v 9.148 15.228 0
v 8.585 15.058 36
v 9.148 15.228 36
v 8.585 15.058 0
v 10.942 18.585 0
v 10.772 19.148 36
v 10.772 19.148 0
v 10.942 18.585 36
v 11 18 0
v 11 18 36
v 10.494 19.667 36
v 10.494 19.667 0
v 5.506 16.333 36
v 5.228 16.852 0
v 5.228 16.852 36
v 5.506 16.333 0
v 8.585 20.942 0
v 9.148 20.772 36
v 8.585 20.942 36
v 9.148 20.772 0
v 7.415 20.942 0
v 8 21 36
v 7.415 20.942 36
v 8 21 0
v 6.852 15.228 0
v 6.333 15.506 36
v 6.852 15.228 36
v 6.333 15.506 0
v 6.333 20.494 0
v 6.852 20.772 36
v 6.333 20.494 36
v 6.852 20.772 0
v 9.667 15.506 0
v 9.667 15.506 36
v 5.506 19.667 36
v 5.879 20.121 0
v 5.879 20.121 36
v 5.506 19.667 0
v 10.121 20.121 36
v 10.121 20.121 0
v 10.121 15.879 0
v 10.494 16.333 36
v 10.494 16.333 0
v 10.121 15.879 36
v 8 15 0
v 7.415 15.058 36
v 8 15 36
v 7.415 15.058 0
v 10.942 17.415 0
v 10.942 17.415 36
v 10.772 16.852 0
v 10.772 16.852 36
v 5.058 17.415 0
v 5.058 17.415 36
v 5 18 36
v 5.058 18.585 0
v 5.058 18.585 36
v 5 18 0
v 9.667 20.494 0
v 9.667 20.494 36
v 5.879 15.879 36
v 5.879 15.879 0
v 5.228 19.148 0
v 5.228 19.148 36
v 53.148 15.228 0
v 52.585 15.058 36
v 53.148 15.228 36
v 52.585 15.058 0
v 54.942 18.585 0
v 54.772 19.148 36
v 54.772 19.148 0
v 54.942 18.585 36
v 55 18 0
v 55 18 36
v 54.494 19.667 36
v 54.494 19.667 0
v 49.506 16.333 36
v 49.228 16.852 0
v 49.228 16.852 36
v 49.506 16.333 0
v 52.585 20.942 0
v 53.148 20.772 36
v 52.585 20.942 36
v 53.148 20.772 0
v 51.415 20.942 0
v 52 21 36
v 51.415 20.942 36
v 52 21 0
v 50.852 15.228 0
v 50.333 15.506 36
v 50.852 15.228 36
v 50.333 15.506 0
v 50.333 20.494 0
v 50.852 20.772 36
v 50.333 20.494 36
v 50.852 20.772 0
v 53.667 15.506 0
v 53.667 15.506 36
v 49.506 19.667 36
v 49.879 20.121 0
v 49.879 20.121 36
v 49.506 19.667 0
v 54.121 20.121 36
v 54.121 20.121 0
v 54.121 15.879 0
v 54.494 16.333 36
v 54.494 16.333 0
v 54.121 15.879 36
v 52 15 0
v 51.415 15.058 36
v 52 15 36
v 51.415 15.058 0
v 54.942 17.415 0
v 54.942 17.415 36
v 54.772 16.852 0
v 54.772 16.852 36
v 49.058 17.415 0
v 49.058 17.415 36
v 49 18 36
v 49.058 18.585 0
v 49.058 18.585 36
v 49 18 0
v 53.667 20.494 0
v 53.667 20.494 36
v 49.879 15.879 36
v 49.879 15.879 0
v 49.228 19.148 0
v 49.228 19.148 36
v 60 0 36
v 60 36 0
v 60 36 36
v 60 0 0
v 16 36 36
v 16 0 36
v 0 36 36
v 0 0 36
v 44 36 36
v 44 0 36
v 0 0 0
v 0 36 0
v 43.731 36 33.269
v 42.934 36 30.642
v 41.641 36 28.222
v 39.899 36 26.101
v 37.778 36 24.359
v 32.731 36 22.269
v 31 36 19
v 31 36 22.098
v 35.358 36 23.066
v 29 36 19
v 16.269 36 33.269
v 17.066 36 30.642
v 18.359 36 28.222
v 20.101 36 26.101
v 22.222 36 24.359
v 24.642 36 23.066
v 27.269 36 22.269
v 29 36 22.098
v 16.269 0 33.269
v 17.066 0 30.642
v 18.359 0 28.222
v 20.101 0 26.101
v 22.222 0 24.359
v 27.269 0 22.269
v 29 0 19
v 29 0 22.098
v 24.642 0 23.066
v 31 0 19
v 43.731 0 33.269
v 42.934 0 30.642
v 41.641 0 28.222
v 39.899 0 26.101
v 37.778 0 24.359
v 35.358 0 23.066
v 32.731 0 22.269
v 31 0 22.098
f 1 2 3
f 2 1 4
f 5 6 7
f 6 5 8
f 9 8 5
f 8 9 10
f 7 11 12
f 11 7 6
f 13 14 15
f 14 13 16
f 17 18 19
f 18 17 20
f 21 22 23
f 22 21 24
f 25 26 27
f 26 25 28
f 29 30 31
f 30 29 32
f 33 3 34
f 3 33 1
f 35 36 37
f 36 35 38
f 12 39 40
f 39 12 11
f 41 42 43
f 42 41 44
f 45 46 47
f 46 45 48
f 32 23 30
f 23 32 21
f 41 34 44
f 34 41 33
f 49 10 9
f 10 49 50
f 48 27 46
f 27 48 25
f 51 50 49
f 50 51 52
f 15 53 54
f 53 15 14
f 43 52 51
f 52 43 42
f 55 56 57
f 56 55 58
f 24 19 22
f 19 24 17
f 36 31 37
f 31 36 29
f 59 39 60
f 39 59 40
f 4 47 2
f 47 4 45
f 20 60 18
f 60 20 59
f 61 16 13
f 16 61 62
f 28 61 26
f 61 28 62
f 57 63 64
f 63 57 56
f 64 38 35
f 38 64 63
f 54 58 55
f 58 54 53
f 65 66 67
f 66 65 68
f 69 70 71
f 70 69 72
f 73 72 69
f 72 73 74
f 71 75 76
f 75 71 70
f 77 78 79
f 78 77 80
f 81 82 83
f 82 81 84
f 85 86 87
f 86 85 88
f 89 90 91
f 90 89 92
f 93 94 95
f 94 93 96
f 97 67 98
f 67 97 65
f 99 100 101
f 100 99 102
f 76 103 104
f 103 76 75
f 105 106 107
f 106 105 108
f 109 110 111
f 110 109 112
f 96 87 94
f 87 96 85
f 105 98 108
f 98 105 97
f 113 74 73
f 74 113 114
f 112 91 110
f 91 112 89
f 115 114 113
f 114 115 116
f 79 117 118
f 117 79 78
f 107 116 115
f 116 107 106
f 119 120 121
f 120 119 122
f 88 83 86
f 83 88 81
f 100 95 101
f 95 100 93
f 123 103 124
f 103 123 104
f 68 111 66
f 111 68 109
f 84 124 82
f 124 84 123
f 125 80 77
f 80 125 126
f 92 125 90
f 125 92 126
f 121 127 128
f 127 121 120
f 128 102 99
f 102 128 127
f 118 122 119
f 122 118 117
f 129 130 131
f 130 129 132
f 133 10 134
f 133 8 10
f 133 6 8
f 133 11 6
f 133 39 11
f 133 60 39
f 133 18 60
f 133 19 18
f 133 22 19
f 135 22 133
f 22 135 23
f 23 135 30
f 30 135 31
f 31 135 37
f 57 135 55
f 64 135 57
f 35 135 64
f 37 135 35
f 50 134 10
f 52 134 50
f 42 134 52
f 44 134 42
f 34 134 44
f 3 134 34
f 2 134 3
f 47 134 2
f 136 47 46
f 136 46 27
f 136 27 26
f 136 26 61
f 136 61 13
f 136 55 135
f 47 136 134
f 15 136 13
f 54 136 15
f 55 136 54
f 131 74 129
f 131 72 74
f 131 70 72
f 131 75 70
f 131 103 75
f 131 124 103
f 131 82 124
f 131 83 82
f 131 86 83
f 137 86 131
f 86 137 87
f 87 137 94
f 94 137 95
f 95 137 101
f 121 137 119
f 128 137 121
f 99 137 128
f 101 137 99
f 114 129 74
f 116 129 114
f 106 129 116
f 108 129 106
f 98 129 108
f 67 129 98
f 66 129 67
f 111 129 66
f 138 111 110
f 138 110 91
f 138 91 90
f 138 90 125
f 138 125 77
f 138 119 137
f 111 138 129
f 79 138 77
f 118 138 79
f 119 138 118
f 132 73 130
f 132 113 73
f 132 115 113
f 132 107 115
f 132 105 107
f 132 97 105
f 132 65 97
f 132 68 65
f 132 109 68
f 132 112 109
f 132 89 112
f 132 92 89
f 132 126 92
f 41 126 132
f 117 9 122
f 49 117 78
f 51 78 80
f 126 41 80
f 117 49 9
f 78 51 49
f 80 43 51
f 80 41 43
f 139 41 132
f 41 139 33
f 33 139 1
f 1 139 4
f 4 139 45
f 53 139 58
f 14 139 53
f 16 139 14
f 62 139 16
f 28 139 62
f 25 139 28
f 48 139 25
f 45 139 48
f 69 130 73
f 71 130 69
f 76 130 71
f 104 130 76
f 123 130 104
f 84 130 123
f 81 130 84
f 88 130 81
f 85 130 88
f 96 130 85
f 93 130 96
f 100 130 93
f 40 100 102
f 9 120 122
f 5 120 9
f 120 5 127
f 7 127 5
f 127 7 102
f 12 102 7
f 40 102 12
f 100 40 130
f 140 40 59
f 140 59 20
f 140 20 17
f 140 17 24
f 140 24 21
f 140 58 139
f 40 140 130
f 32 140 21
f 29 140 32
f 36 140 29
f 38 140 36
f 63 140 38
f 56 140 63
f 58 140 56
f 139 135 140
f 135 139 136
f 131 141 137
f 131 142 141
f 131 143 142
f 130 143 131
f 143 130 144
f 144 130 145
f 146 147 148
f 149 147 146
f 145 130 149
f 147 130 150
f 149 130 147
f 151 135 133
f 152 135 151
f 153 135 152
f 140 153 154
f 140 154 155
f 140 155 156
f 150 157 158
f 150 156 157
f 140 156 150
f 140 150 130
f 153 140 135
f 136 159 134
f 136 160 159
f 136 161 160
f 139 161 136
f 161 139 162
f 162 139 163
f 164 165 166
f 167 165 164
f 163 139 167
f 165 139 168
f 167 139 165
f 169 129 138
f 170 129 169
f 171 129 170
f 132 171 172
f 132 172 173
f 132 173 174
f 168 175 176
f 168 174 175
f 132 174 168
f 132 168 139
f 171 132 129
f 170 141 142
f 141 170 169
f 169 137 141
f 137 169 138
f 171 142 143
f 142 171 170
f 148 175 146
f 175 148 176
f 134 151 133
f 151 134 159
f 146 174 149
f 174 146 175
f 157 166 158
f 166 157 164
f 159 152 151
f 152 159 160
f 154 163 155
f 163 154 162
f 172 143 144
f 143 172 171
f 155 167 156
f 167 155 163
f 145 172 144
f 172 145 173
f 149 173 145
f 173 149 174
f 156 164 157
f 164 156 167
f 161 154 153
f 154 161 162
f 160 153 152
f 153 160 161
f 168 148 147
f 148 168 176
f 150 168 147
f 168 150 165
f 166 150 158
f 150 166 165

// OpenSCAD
$fn = 32;

// ----------------------------------------------------------------------
// Saddle clamp: split shaft clamp
// ----------------------------------------------------------------------

// --- parameters (mm) ---
blk_l = 60;               // block length, X
blk_w = 36;               // block width, Y
blk_h = 36;               // block height
clamp_r = 14;             // shaft groove radius
hole_r = 3;               // bolt hole radius
hole_m = 8;               // bolt hole margin from the ends
saw_w = 2;                // saw kerf width

saw_depth = clamp_r + 3;  // saw kerf depth

difference() {
  cube([blk_l, blk_w, blk_h]);
  translate([blk_l / 2, -1, blk_h])
    rotate([-90, 0, 0])
      cylinder(h = blk_w + 2, r = clamp_r);
  for (sx = [0, 1])
    translate([sx ? blk_l - hole_m : hole_m, blk_w / 2, -1])
      cylinder(r = hole_r, h = blk_h + 2);
  translate([blk_l / 2 - saw_w / 2, -1, blk_h - saw_depth])
    cube([saw_w, blk_w + 2, saw_depth + 1]);
}
